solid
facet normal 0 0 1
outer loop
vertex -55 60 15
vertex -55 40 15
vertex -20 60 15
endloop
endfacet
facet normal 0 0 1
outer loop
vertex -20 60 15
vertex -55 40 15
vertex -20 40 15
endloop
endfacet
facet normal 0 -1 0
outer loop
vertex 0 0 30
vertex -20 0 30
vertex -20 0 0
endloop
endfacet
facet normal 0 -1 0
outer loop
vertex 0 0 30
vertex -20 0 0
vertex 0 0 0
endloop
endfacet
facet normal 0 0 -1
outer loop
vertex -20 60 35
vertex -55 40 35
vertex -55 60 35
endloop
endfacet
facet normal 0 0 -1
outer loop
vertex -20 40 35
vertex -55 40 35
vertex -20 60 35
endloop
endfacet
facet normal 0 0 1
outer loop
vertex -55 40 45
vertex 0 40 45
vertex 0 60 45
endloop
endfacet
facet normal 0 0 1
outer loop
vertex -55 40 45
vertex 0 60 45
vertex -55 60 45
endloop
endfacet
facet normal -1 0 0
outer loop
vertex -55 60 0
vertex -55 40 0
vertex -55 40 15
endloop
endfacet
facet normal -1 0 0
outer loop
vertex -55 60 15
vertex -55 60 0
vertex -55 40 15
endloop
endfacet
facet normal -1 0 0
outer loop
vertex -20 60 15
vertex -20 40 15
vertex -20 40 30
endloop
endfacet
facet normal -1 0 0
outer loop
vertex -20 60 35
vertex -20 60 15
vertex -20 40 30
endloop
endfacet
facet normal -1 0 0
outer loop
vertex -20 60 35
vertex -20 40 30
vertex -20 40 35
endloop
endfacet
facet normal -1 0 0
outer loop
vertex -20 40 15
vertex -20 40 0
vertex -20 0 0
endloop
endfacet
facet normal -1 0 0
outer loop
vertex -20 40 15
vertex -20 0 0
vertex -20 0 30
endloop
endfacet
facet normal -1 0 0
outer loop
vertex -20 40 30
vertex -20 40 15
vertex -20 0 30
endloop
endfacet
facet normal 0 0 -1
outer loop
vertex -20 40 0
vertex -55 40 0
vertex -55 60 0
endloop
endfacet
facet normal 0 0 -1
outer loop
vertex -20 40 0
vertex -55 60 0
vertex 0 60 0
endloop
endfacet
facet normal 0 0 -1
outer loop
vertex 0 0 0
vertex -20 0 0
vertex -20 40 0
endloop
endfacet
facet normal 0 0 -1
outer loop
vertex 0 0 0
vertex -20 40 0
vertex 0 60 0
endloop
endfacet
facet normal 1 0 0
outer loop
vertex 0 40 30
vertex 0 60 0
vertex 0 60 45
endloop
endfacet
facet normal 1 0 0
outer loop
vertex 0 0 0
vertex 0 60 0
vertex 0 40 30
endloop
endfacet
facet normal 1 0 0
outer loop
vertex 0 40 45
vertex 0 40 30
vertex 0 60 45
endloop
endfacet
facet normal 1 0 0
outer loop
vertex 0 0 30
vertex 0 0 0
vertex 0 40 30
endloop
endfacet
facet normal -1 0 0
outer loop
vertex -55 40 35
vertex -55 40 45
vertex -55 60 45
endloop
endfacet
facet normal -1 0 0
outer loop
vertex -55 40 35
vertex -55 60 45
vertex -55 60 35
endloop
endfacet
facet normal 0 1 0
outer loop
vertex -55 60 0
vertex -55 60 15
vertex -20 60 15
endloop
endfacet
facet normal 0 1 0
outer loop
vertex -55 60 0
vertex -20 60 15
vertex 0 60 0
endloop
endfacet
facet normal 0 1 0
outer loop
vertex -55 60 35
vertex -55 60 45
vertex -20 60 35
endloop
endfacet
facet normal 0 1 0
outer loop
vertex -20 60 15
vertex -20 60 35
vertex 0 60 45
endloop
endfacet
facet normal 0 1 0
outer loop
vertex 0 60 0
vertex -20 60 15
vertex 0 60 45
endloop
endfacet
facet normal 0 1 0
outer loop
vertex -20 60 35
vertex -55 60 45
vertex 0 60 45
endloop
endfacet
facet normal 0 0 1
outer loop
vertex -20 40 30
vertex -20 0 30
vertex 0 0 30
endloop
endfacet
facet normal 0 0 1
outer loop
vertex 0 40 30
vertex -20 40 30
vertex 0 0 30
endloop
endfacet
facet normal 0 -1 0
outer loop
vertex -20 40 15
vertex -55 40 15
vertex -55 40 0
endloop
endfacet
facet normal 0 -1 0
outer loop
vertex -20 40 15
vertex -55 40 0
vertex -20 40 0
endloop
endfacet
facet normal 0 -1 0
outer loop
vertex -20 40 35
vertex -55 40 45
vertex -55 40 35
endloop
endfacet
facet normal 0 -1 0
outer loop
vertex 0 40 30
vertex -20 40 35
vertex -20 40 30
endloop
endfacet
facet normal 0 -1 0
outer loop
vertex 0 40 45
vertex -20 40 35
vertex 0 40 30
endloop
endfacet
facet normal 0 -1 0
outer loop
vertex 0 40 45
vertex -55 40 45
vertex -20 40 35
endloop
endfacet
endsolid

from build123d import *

# Parameters (mm, degrees)
F0_W     = 35
F0_H     = 15
F1_DEPTH = 60
F2_DEPTH = 40
F3_DEPTH = 40


with BuildPart() as f1:
    # F0 (on Front) → F1 (new body)
    with BuildSketch(Plane.XZ):
        Polygon((-20, 0), (0, 0), (0, 30), (-20, 30), (-20, 15), align=None)
        Polygon((-20, 30), (0, 30), (0, 45), (-55, 45), (-55, 35), (-20, 35), align=None)
        with Locations((-37.5, 7.5)):
            Rectangle(F0_W, F0_H)
    extrude(amount=-F1_DEPTH)

    # F0 (on Front) → F2 (cut)
    with BuildSketch(Plane.XZ):
        Polygon((-20, 30), (0, 30), (0, 45), (-55, 45), (-55, 35), (-20, 35), align=None)
    extrude(amount=-F2_DEPTH, mode=Mode.SUBTRACT)

    # F0 (on Front) → F3 (cut)
    with BuildSketch(Plane.XZ):
        with Locations((-37.5, 7.5)):
            Rectangle(F0_W, F0_H)
    extrude(amount=-F3_DEPTH, mode=Mode.SUBTRACT)


solid = f1.part
